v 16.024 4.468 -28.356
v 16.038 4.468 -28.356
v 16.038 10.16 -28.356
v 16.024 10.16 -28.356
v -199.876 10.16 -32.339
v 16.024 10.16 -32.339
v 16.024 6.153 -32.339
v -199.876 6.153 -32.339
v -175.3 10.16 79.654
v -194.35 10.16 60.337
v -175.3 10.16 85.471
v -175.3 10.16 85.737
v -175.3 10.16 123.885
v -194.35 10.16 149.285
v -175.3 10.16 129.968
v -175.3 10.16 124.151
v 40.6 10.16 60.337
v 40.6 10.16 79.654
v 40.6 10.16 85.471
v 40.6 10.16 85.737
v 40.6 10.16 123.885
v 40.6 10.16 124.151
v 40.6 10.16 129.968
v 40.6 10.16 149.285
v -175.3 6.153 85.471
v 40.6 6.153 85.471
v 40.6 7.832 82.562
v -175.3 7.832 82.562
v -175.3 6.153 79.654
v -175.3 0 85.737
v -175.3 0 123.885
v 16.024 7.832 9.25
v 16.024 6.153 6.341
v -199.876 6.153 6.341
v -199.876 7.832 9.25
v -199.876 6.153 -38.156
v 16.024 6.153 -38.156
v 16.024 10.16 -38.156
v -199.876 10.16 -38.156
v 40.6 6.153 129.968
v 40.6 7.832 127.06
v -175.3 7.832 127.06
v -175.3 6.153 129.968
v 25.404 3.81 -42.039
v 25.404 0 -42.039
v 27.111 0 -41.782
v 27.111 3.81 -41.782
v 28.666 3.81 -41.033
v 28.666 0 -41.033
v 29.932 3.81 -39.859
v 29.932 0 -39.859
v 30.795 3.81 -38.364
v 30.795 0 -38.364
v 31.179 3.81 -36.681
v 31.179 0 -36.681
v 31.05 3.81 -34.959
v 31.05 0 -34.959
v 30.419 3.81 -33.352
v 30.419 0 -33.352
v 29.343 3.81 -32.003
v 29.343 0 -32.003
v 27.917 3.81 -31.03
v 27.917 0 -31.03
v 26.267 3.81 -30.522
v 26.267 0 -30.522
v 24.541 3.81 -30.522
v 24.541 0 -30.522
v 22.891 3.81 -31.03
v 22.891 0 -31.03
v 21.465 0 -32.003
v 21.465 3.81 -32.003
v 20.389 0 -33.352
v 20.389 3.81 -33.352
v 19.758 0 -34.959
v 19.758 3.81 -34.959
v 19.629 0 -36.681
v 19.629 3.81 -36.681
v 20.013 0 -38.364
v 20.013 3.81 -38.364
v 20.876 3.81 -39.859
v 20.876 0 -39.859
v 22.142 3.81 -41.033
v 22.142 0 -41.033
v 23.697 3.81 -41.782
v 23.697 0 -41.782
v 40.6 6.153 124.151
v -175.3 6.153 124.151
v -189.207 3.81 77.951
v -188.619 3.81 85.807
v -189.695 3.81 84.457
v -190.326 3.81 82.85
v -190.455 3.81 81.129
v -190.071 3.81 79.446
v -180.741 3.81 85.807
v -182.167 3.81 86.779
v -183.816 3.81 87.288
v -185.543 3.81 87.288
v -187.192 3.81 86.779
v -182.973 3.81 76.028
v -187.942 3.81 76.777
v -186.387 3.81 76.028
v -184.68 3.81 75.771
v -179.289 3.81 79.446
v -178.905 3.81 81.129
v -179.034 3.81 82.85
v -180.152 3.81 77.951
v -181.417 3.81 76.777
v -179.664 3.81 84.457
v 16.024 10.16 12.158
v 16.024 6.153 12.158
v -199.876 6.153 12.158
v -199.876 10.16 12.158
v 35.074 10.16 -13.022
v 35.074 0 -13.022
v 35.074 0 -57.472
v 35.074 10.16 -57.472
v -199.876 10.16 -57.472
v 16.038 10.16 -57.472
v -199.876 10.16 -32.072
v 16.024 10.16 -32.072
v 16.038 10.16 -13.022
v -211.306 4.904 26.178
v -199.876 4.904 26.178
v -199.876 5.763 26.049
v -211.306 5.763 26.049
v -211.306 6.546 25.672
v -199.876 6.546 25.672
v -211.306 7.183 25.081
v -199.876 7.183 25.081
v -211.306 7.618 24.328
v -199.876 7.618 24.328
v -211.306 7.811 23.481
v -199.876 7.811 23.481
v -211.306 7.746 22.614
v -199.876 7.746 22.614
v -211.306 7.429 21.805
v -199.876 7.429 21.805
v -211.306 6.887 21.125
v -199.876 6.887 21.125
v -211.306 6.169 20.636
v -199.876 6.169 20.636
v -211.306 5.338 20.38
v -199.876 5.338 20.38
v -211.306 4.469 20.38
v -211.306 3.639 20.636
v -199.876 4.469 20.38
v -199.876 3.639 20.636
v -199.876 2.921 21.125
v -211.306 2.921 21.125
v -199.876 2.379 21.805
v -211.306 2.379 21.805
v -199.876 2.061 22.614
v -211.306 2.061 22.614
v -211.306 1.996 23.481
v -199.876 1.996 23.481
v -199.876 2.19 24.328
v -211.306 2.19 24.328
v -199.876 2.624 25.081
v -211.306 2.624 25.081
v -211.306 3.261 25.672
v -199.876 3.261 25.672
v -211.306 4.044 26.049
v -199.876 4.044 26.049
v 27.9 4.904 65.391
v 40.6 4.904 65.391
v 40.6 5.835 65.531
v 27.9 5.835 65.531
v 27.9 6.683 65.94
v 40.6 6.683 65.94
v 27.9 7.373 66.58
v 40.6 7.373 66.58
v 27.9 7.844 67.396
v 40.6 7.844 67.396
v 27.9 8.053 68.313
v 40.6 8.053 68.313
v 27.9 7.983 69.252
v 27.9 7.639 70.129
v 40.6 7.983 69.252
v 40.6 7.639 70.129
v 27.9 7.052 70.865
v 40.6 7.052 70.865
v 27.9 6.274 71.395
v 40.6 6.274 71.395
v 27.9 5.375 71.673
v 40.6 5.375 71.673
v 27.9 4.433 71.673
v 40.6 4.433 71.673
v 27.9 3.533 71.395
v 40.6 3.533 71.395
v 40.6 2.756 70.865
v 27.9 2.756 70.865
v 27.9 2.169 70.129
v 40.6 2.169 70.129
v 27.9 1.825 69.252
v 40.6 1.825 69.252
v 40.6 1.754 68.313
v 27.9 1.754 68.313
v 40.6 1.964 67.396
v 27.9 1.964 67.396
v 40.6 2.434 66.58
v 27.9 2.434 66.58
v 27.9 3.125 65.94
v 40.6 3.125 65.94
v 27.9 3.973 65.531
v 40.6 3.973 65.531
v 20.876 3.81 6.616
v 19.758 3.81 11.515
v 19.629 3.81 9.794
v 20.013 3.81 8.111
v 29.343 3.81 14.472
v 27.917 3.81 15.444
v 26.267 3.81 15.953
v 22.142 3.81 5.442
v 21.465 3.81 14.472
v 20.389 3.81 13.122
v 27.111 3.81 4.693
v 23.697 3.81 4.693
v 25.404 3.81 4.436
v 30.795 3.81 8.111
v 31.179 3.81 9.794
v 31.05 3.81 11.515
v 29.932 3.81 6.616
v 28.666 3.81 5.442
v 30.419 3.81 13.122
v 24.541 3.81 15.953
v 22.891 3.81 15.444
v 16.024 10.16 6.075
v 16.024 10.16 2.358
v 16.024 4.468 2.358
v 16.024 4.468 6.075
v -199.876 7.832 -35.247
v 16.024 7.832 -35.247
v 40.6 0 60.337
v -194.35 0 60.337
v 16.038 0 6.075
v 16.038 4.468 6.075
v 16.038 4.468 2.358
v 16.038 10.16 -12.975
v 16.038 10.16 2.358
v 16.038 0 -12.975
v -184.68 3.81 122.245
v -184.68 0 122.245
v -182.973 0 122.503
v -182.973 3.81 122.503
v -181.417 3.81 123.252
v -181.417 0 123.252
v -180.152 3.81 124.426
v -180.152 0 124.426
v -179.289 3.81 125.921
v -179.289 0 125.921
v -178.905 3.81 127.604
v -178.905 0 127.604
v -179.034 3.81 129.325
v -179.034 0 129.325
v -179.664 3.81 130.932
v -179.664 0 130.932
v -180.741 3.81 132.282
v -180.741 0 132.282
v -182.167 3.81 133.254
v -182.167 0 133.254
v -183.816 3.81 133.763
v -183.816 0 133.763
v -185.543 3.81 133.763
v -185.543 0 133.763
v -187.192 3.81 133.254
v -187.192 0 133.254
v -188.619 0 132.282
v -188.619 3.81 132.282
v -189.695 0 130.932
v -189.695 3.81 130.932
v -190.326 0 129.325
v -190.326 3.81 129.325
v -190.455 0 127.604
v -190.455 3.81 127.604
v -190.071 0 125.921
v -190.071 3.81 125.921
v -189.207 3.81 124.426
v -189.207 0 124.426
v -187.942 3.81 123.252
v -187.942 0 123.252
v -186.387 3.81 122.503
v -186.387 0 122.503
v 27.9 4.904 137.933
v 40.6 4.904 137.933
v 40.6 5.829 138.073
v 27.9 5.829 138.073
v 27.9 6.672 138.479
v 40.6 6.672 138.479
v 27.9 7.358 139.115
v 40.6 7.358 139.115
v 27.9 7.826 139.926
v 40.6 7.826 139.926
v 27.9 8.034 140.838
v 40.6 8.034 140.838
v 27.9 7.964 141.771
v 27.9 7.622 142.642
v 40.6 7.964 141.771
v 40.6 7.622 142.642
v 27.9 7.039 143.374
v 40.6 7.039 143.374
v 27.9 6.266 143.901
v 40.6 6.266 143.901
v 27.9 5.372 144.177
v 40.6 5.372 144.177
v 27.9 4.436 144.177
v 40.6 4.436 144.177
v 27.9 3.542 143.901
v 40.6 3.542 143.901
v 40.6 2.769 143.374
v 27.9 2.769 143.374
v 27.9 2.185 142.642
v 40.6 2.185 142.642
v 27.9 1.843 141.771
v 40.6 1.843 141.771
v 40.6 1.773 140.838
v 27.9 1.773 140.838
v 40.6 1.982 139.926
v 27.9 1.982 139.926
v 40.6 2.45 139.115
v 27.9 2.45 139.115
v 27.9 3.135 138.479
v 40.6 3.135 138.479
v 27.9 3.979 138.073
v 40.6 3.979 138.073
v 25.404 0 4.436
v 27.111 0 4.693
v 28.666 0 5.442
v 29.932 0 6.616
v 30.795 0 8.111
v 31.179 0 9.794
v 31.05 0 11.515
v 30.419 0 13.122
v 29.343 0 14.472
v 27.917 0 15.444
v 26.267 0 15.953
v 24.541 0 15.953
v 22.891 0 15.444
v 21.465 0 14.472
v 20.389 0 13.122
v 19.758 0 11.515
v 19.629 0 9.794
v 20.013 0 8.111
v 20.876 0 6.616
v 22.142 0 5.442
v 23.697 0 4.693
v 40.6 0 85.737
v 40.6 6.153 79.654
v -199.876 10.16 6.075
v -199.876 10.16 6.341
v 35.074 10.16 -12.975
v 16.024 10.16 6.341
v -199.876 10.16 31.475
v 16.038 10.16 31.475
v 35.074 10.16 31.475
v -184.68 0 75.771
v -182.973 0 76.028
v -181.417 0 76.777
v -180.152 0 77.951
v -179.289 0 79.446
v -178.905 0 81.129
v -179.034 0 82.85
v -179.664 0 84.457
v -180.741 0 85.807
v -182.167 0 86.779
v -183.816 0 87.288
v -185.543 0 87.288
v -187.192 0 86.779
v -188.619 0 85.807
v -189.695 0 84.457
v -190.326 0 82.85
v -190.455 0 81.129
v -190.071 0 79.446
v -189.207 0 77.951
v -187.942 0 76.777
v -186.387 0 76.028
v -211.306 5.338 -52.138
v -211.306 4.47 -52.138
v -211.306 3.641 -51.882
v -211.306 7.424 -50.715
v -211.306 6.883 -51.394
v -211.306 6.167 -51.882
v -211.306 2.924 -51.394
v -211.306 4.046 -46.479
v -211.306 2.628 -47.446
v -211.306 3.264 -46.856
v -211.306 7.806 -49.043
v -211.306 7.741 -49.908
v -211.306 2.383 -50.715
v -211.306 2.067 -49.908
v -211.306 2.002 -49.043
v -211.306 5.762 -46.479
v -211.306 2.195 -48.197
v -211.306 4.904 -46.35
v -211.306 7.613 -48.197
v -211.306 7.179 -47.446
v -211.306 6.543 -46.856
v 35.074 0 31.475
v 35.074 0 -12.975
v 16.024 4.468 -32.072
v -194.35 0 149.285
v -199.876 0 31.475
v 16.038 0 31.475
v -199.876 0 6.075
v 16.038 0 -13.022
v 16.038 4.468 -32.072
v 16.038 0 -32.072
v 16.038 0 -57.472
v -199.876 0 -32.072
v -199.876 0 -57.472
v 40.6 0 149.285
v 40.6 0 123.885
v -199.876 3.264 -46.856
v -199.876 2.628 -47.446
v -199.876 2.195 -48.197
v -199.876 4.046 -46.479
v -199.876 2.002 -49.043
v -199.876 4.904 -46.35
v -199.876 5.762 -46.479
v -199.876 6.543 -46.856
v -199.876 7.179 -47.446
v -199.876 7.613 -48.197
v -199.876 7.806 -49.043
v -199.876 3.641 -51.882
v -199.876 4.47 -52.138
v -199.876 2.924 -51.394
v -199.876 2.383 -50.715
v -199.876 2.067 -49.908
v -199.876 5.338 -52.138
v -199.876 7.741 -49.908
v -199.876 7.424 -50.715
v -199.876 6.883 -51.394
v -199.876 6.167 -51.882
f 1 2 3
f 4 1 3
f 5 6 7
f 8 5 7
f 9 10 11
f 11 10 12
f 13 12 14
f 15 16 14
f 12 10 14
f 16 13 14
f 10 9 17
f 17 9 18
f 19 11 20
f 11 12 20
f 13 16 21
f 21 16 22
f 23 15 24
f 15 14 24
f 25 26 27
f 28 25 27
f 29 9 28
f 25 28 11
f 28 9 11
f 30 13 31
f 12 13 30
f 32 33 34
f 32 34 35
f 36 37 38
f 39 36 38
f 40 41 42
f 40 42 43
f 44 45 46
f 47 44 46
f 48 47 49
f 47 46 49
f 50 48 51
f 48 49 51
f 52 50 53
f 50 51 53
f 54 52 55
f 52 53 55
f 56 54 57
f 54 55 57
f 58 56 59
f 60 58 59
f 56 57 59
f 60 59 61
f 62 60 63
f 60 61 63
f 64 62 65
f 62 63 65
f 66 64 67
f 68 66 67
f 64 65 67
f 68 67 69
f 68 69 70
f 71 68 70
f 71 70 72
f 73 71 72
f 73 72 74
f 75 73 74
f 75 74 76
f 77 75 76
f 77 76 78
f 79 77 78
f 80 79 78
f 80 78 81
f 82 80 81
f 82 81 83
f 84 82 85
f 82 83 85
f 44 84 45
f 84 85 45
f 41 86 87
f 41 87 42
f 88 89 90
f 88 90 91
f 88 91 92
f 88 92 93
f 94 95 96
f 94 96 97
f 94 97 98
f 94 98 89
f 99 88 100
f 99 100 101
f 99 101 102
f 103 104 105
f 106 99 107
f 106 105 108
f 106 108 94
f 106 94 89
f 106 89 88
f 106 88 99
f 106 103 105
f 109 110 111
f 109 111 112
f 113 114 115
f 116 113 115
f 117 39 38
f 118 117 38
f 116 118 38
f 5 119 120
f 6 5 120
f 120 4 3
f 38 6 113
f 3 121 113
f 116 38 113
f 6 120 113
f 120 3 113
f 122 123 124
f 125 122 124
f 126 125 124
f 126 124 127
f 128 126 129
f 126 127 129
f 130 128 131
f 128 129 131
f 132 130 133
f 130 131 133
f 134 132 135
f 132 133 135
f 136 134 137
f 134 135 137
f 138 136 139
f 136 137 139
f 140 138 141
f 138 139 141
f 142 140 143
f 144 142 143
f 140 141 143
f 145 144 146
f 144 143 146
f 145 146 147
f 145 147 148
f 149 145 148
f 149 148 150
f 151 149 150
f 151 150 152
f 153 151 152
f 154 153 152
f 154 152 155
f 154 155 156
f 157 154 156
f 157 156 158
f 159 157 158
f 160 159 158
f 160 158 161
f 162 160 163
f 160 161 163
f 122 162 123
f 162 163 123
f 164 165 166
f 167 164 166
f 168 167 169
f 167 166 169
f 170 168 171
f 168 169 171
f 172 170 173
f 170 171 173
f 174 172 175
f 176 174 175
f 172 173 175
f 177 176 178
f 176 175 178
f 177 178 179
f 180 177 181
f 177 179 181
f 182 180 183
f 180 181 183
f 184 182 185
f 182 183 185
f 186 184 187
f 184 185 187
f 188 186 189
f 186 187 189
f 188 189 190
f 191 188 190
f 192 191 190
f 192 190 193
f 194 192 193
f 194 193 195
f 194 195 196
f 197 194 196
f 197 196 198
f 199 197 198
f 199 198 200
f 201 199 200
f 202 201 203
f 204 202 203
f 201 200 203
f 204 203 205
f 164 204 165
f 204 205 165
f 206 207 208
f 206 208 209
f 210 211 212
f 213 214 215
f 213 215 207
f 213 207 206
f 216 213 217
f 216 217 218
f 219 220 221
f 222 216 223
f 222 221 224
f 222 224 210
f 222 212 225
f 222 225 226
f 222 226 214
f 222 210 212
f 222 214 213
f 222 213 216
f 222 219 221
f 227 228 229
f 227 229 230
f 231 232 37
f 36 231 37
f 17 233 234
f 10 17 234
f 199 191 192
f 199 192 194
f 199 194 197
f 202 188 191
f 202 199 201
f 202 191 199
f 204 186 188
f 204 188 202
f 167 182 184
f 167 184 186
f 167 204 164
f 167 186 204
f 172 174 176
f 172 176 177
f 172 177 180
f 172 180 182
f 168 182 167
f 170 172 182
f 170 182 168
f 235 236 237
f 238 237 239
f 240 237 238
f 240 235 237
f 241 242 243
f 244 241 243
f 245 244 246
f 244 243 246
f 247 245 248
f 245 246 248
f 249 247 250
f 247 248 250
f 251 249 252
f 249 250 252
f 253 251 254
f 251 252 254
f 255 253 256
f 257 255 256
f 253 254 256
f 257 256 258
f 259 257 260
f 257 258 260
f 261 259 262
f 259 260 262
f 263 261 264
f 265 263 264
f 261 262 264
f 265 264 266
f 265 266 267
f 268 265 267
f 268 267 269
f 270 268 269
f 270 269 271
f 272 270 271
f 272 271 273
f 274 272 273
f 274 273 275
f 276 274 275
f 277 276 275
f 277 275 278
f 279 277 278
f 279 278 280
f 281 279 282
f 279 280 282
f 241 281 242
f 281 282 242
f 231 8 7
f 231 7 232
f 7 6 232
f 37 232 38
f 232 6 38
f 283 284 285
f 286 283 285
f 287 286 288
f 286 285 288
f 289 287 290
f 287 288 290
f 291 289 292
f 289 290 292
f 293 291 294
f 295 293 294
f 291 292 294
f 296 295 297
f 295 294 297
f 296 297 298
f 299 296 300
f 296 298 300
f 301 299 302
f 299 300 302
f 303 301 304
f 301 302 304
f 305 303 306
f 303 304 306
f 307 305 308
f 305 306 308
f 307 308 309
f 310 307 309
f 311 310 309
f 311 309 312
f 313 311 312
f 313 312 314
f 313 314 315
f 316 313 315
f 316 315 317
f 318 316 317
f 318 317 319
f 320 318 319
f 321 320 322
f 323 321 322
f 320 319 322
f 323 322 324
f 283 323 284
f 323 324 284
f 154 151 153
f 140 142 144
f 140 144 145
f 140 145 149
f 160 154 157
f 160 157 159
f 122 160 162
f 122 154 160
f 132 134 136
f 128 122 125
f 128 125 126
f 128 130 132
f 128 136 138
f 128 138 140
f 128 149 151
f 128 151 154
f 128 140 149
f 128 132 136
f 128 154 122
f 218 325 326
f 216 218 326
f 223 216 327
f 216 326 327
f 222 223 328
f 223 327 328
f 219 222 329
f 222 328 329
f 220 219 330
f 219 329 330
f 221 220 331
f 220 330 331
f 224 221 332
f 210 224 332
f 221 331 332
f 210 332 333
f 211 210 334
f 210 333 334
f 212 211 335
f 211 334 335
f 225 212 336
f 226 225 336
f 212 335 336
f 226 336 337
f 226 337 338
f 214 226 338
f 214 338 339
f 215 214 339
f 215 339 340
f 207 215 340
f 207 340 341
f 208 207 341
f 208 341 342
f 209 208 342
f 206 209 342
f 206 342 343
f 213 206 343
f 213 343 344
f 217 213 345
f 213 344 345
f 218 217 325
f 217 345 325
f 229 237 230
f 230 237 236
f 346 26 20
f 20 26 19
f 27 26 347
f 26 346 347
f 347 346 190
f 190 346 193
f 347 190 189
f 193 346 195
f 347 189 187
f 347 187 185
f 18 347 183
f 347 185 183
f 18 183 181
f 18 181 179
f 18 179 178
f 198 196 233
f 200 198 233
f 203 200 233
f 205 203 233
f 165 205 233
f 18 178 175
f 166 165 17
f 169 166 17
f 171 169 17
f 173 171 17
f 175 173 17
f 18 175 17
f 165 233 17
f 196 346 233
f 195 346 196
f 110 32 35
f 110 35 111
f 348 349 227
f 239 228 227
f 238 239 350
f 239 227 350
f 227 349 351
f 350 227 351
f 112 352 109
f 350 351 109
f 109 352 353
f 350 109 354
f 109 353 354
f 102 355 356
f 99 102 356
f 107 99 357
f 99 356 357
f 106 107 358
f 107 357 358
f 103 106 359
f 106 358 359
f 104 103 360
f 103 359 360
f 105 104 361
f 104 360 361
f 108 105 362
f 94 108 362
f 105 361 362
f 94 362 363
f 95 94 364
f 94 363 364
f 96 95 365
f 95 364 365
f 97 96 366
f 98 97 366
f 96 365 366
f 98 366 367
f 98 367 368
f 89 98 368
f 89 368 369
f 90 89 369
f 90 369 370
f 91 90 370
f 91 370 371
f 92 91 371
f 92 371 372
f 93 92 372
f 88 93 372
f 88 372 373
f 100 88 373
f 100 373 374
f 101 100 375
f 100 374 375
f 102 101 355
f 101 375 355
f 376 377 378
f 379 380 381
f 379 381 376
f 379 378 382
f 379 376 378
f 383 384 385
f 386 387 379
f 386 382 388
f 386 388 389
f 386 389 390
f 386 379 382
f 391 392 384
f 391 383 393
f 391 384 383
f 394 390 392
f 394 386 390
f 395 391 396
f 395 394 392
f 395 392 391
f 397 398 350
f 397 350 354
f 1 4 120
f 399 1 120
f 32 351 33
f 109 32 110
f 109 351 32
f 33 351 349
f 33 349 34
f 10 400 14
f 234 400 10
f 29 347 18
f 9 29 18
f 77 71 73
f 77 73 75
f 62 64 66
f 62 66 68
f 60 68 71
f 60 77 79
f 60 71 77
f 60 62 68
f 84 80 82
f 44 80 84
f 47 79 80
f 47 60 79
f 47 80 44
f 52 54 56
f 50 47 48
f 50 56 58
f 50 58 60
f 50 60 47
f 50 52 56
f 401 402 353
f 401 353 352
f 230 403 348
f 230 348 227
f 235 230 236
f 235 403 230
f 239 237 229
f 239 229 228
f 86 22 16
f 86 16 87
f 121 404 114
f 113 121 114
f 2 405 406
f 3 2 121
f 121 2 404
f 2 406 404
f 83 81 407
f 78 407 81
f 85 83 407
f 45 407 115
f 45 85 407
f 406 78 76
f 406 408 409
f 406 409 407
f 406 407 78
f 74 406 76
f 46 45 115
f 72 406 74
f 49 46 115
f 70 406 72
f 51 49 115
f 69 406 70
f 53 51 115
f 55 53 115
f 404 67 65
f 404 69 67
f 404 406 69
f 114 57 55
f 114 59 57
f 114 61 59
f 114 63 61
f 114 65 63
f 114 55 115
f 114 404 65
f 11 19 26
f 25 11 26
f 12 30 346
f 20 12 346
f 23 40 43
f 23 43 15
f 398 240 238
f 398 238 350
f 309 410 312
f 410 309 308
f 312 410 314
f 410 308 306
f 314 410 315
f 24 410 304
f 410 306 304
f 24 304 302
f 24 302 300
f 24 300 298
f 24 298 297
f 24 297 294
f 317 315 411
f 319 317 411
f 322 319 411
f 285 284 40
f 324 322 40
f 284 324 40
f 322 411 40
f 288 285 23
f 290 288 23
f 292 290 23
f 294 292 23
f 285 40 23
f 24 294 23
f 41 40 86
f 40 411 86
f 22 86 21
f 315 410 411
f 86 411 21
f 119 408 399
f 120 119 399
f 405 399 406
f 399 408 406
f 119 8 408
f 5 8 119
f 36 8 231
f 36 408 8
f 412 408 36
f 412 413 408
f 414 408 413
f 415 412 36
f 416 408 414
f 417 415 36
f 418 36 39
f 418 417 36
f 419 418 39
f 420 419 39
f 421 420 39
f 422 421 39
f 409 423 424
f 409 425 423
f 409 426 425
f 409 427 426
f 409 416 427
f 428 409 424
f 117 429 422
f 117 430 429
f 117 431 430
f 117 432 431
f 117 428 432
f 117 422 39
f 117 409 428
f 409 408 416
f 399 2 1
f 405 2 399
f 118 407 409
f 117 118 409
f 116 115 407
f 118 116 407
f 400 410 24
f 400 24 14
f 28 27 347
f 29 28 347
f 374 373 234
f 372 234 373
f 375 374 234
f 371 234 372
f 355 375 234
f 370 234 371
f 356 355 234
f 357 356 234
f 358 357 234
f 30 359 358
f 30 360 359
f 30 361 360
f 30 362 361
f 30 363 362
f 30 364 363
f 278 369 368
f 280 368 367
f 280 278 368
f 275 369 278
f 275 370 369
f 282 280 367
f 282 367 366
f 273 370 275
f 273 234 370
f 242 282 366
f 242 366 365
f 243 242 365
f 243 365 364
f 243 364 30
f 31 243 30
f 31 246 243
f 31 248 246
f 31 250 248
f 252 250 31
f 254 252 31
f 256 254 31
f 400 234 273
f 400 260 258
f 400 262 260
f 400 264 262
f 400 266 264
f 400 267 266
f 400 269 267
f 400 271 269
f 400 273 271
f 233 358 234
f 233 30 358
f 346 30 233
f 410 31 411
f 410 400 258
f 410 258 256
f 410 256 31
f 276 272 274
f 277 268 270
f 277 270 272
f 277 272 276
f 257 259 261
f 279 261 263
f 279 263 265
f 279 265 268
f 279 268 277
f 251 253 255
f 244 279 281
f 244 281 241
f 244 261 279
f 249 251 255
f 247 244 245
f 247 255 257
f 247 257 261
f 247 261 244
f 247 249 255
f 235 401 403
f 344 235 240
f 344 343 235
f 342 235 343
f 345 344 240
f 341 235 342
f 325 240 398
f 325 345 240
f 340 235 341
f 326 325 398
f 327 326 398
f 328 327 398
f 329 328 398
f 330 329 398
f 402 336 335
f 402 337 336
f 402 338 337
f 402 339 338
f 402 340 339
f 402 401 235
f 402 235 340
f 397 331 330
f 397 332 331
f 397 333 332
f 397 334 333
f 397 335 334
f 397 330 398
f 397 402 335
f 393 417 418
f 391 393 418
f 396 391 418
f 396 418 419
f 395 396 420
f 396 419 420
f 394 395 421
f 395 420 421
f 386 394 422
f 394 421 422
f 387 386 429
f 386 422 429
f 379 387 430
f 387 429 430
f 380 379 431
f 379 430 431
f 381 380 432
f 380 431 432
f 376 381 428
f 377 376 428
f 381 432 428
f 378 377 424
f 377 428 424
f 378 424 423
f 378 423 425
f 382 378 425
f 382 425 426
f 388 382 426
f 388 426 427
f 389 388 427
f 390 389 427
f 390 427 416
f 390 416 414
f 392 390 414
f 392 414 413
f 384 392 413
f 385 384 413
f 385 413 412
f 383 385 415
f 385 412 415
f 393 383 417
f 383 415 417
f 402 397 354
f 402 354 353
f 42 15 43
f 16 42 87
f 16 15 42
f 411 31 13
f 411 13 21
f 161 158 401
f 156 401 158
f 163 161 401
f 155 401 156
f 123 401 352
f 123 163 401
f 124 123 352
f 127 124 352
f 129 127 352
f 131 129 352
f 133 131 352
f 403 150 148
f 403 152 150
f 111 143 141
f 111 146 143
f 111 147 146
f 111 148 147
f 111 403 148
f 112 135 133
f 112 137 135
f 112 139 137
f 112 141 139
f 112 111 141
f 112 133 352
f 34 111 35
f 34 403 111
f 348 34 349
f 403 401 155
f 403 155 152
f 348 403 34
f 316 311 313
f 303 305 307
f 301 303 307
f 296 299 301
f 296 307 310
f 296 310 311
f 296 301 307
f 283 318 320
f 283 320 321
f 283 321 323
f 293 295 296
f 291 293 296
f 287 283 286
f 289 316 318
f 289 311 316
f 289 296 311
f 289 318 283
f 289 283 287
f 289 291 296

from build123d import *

# Parameters (mm, degrees)
BOSS_EXTRUDE1_DEPTH      = 10.16
CUT_EXTRUDE1_DEPTH       = 469.9
SKETCH7_W                = 12.402912868
SKETCH7_H                = 5.692085864
BOSS_EXTRUDE2_DEPTH      = 19.05
SKETCH8_W                = 44.473666897
SKETCH8_H                = 10.16
BOSS_EXTRUDE3_DEPTH      = 19.05
SKETCH11_R               = 5.7912
CUT_EXTRUDE2_DEPTH       = 3.81
SURFACE_EXTRUDE1_1_BACK  = 127
SURFACE_EXTRUDE1_1_DEPTH = 127
SURFACE_EXTRUDE1_2_BACK  = 127
SURFACE_EXTRUDE1_2_DEPTH = 127
SKETCH13_R               = 3.158479385
CUT_EXTRUDE3_DEPTH       = 12.7
SKETCH15_R               = 2.910262426
BOSS_EXTRUDE6_DEPTH      = 11.43
SKETCH16_R               = 2.915718577
BOSS_EXTRUDE7_DEPTH      = 11.43
SKETCH17_R               = 3.139130121
CUT_EXTRUDE4_DEPTH       = 12.7


with BuildPart() as part:
    # Sketch1 → Boss-Extrude1 (new body)
    with BuildSketch(Plane(origin=(0, 0, 0), x_dir=(1, 0, 0), z_dir=(0, 1, 0))):
        Polygon((16.038025544, 57.472460937), (-434.826171875, 57.472460937), (-434.826171875, 13.022460937), (-415.790369294, 13.022460937), (-415.790369294, 32.072460937), (16.038025544, 32.072460938), align=None)
        Polygon((35.073828125, 57.472460938), (16.038025544, 57.472460937), (16.038025544, 32.072460938), (16.038025544, 13.022460938), (35.073828125, 13.022460938), align=None)
    extrude(amount=BOSS_EXTRUDE1_DEPTH)

    # Sketch3 → Cut-Extrude1 (cut)
    with BuildSketch(Plane(origin=(35.073828125, 0, 0), x_dir=(0, 0, -1), z_dir=(1, 0, 0))):
        Polygon((38.155998325, 6.152693314), (38.155998325, 10.16), (32.33892355, 10.16), (32.33892355, 6.152693314), (35.247460938, 7.831938158), align=None)
    extrude(amount=-CUT_EXTRUDE1_DEPTH, mode=Mode.SUBTRACT)

    # Sketch7 → Boss-Extrude2 (add)
    with BuildSketch(Plane(origin=(35.073828125, 0, 0), x_dir=(0, 0, -1), z_dir=(1, 0, 0))):
        with Locations((34.557393907, 7.313957068)):
            Rectangle(SKETCH7_W, SKETCH7_H)
    extrude(amount=-BOSS_EXTRUDE2_DEPTH)

    # Sketch8 → Boss-Extrude3 (add)
    with BuildSketch(Plane.ZY.offset(434.826171875)):
        with Locations((-35.23562749, 5.08)):
            Rectangle(SKETCH8_W, SKETCH8_H)
    extrude(amount=-BOSS_EXTRUDE3_DEPTH)

    # Mirror1: part across plane


with BuildPart() as part_1:
    add(part.part)
    add(part.part.mirror(Plane(origin=(-415.776171875, 10.16, -12.998794041), x_dir=(1, 0, 0), z_dir=(0, 0, 1))))

    # Sketch11 → Cut-Extrude2 (cut)
    with BuildSketch(Plane.XZ):
        with Locations(Location((-425.156251148, 10.226790326, 0), (0, 0, 270))):
            Circle(SKETCH11_R)
        with Locations(Location((25.403907398, -36.248045304, 0), (0, 0, 270))):
            Circle(SKETCH11_R)
        with Locations(Location((25.403907398, 10.226790326, 0), (0, 0, 270))):
            Circle(SKETCH11_R)
        with Locations(Location((-425.156251148, -36.248045304, 0), (0, 0, 270))):
            Circle(SKETCH11_R)
    extrude(amount=-CUT_EXTRUDE2_DEPTH, mode=Mode.SUBTRACT)


with BuildPart() as body_2:
    # Split1: the piece behind the surface
    add(part_1.part)
    # Surface-Extrude1: a surface, the sketch's curves swept straight by 127 mm
    with BuildLine(Plane.XY.offset(31.474872855).offset(-SURFACE_EXTRUDE1_1_BACK), mode=Mode.PRIVATE) as surface_extrude1_1_path:
        Line((-199.876171875, -28.692285392), (-199.876171875, 81.458221416))
    surface_extrude1_1 = Shell.extrude(surface_extrude1_1_path.wire(), (0 * SURFACE_EXTRUDE1_1_DEPTH, 0 * SURFACE_EXTRUDE1_1_DEPTH, 1 * SURFACE_EXTRUDE1_1_DEPTH))
    split(bisect_by=surface_extrude1_1, keep=Keep.BOTTOM)

    # Sketch15 → Boss-Extrude6 (add)
    with BuildSketch(Plane.ZY.offset(199.876171875)):
        with Locations((-49.260284321, 4.9038256)):
            Circle(SKETCH15_R)
    extrude(amount=BOSS_EXTRUDE6_DEPTH)

    # Sketch16 → Boss-Extrude7 (add)
    with BuildSketch(Plane.ZY.offset(199.876171875)):
        with Locations((23.262696239, 4.9038256)):
            Circle(SKETCH16_R)
    extrude(amount=BOSS_EXTRUDE7_DEPTH)


with BuildPart() as part_2:
    add(part_1.part)

    # Split1: split by a surface, the side it looks to stays
    # Surface-Extrude1: a surface, the sketch's curves swept straight by 127 mm
    with BuildLine(Plane.XY.offset(31.474872855).offset(-SURFACE_EXTRUDE1_2_BACK), mode=Mode.PRIVATE) as surface_extrude1_2_path:
        Line((-199.876171875, -28.692285392), (-199.876171875, 81.458221416))
    surface_extrude1_2 = Shell.extrude(surface_extrude1_2_path.wire(), (0 * SURFACE_EXTRUDE1_2_DEPTH, 0 * SURFACE_EXTRUDE1_2_DEPTH, 1 * SURFACE_EXTRUDE1_2_DEPTH))
    split(bisect_by=surface_extrude1_2, keep=Keep.TOP)


with BuildPart() as part_3:
    # Body-Move/Copy1: moved
    add(part_2.part.moved(Location((240.476626778, 0, 117.80977063))))

    # Sketch13 → Cut-Extrude3 (cut)
    with BuildSketch(Plane(origin=(40.600454903, 0, 0), x_dir=(0, 0, -1), z_dir=(1, 0, 0))):
        with Locations((-68.549486363, 4.903834039)):
            Circle(SKETCH13_R)
    extrude(amount=-CUT_EXTRUDE3_DEPTH, mode=Mode.SUBTRACT)

    # Sketch17 → Cut-Extrude4 (cut)
    with BuildSketch(Plane(origin=(40.600454903, 0, 0), x_dir=(0, 0, -1), z_dir=(1, 0, 0))):
        with Locations((-141.072466869, 4.9038256)):
            Circle(SKETCH17_R)
    extrude(amount=-CUT_EXTRUDE4_DEPTH, mode=Mode.SUBTRACT)


solid = Compound([body_2.part, part_3.part])
